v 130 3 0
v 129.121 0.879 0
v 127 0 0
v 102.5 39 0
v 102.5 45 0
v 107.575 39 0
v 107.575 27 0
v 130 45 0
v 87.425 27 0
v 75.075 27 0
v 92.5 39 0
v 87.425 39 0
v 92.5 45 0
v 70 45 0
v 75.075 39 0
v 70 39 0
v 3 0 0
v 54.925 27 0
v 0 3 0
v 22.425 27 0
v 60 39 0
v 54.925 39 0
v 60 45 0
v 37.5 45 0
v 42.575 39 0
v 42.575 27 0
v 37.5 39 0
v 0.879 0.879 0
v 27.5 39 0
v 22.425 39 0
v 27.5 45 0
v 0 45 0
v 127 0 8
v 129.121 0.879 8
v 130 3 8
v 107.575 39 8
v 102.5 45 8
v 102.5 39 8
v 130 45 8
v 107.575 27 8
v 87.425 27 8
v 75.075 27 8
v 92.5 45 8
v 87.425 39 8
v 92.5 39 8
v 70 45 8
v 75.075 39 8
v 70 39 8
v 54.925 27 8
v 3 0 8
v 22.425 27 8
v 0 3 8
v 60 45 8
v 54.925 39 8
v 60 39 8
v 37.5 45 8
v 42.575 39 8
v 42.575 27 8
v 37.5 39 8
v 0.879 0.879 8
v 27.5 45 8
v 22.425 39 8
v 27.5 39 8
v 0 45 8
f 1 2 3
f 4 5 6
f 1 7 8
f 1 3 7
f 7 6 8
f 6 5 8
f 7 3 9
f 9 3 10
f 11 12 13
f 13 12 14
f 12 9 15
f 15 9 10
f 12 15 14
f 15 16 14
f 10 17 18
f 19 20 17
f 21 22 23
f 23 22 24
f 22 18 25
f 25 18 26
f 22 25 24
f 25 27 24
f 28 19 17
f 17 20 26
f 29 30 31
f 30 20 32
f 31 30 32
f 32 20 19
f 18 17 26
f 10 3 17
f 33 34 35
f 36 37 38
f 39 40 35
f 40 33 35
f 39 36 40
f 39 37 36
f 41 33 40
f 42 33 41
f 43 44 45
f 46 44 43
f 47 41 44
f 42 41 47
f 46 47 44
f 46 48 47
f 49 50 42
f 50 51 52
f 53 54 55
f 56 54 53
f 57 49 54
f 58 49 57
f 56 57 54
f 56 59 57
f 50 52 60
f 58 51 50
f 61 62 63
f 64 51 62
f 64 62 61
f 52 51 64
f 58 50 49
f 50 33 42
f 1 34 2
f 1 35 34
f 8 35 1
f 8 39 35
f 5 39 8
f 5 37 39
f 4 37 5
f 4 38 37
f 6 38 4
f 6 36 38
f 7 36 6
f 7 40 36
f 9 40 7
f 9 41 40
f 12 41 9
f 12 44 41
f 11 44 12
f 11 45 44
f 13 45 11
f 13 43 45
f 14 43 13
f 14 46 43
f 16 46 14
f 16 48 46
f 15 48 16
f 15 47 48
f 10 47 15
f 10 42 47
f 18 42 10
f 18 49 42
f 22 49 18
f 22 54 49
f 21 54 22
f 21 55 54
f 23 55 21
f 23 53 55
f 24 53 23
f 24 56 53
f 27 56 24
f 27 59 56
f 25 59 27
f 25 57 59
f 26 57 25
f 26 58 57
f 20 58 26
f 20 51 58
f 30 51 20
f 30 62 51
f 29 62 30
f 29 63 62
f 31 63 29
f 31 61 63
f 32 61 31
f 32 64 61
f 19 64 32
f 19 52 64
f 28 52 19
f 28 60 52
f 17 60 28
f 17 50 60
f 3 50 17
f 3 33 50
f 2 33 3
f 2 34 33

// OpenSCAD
$fn = 32;

// ----------------------------------------------------------------------
// Window plate: 130 x 45 mm, 3 open windows
// ----------------------------------------------------------------------

// --- parameters (mm) ---
profile_height = 8;       // extrusion height
profile_points = 32;      // points of the closed outline

profile = [[0, 3], [0.879, 0.879], [3, 0], [127, 0], [129.121, 0.879], [130, 3], [130, 45], [102.5, 45], [102.5, 39], [107.575, 39], [107.575, 27], [87.425, 27], [87.425, 39], [92.5, 39], [92.5, 45], [70, 45], [70, 39], [75.075, 39], [75.075, 27], [54.925, 27], [54.925, 39], [60, 39], [60, 45], [37.5, 45], [37.5, 39], [42.575, 39], [42.575, 27], [22.425, 27], [22.425, 39], [27.5, 39], [27.5, 45], [0, 45]];  // single closed polygon, 32 points, counter clockwise

// --- the one profile operation ---
linear_extrude(height = profile_height) polygon(points = profile);
